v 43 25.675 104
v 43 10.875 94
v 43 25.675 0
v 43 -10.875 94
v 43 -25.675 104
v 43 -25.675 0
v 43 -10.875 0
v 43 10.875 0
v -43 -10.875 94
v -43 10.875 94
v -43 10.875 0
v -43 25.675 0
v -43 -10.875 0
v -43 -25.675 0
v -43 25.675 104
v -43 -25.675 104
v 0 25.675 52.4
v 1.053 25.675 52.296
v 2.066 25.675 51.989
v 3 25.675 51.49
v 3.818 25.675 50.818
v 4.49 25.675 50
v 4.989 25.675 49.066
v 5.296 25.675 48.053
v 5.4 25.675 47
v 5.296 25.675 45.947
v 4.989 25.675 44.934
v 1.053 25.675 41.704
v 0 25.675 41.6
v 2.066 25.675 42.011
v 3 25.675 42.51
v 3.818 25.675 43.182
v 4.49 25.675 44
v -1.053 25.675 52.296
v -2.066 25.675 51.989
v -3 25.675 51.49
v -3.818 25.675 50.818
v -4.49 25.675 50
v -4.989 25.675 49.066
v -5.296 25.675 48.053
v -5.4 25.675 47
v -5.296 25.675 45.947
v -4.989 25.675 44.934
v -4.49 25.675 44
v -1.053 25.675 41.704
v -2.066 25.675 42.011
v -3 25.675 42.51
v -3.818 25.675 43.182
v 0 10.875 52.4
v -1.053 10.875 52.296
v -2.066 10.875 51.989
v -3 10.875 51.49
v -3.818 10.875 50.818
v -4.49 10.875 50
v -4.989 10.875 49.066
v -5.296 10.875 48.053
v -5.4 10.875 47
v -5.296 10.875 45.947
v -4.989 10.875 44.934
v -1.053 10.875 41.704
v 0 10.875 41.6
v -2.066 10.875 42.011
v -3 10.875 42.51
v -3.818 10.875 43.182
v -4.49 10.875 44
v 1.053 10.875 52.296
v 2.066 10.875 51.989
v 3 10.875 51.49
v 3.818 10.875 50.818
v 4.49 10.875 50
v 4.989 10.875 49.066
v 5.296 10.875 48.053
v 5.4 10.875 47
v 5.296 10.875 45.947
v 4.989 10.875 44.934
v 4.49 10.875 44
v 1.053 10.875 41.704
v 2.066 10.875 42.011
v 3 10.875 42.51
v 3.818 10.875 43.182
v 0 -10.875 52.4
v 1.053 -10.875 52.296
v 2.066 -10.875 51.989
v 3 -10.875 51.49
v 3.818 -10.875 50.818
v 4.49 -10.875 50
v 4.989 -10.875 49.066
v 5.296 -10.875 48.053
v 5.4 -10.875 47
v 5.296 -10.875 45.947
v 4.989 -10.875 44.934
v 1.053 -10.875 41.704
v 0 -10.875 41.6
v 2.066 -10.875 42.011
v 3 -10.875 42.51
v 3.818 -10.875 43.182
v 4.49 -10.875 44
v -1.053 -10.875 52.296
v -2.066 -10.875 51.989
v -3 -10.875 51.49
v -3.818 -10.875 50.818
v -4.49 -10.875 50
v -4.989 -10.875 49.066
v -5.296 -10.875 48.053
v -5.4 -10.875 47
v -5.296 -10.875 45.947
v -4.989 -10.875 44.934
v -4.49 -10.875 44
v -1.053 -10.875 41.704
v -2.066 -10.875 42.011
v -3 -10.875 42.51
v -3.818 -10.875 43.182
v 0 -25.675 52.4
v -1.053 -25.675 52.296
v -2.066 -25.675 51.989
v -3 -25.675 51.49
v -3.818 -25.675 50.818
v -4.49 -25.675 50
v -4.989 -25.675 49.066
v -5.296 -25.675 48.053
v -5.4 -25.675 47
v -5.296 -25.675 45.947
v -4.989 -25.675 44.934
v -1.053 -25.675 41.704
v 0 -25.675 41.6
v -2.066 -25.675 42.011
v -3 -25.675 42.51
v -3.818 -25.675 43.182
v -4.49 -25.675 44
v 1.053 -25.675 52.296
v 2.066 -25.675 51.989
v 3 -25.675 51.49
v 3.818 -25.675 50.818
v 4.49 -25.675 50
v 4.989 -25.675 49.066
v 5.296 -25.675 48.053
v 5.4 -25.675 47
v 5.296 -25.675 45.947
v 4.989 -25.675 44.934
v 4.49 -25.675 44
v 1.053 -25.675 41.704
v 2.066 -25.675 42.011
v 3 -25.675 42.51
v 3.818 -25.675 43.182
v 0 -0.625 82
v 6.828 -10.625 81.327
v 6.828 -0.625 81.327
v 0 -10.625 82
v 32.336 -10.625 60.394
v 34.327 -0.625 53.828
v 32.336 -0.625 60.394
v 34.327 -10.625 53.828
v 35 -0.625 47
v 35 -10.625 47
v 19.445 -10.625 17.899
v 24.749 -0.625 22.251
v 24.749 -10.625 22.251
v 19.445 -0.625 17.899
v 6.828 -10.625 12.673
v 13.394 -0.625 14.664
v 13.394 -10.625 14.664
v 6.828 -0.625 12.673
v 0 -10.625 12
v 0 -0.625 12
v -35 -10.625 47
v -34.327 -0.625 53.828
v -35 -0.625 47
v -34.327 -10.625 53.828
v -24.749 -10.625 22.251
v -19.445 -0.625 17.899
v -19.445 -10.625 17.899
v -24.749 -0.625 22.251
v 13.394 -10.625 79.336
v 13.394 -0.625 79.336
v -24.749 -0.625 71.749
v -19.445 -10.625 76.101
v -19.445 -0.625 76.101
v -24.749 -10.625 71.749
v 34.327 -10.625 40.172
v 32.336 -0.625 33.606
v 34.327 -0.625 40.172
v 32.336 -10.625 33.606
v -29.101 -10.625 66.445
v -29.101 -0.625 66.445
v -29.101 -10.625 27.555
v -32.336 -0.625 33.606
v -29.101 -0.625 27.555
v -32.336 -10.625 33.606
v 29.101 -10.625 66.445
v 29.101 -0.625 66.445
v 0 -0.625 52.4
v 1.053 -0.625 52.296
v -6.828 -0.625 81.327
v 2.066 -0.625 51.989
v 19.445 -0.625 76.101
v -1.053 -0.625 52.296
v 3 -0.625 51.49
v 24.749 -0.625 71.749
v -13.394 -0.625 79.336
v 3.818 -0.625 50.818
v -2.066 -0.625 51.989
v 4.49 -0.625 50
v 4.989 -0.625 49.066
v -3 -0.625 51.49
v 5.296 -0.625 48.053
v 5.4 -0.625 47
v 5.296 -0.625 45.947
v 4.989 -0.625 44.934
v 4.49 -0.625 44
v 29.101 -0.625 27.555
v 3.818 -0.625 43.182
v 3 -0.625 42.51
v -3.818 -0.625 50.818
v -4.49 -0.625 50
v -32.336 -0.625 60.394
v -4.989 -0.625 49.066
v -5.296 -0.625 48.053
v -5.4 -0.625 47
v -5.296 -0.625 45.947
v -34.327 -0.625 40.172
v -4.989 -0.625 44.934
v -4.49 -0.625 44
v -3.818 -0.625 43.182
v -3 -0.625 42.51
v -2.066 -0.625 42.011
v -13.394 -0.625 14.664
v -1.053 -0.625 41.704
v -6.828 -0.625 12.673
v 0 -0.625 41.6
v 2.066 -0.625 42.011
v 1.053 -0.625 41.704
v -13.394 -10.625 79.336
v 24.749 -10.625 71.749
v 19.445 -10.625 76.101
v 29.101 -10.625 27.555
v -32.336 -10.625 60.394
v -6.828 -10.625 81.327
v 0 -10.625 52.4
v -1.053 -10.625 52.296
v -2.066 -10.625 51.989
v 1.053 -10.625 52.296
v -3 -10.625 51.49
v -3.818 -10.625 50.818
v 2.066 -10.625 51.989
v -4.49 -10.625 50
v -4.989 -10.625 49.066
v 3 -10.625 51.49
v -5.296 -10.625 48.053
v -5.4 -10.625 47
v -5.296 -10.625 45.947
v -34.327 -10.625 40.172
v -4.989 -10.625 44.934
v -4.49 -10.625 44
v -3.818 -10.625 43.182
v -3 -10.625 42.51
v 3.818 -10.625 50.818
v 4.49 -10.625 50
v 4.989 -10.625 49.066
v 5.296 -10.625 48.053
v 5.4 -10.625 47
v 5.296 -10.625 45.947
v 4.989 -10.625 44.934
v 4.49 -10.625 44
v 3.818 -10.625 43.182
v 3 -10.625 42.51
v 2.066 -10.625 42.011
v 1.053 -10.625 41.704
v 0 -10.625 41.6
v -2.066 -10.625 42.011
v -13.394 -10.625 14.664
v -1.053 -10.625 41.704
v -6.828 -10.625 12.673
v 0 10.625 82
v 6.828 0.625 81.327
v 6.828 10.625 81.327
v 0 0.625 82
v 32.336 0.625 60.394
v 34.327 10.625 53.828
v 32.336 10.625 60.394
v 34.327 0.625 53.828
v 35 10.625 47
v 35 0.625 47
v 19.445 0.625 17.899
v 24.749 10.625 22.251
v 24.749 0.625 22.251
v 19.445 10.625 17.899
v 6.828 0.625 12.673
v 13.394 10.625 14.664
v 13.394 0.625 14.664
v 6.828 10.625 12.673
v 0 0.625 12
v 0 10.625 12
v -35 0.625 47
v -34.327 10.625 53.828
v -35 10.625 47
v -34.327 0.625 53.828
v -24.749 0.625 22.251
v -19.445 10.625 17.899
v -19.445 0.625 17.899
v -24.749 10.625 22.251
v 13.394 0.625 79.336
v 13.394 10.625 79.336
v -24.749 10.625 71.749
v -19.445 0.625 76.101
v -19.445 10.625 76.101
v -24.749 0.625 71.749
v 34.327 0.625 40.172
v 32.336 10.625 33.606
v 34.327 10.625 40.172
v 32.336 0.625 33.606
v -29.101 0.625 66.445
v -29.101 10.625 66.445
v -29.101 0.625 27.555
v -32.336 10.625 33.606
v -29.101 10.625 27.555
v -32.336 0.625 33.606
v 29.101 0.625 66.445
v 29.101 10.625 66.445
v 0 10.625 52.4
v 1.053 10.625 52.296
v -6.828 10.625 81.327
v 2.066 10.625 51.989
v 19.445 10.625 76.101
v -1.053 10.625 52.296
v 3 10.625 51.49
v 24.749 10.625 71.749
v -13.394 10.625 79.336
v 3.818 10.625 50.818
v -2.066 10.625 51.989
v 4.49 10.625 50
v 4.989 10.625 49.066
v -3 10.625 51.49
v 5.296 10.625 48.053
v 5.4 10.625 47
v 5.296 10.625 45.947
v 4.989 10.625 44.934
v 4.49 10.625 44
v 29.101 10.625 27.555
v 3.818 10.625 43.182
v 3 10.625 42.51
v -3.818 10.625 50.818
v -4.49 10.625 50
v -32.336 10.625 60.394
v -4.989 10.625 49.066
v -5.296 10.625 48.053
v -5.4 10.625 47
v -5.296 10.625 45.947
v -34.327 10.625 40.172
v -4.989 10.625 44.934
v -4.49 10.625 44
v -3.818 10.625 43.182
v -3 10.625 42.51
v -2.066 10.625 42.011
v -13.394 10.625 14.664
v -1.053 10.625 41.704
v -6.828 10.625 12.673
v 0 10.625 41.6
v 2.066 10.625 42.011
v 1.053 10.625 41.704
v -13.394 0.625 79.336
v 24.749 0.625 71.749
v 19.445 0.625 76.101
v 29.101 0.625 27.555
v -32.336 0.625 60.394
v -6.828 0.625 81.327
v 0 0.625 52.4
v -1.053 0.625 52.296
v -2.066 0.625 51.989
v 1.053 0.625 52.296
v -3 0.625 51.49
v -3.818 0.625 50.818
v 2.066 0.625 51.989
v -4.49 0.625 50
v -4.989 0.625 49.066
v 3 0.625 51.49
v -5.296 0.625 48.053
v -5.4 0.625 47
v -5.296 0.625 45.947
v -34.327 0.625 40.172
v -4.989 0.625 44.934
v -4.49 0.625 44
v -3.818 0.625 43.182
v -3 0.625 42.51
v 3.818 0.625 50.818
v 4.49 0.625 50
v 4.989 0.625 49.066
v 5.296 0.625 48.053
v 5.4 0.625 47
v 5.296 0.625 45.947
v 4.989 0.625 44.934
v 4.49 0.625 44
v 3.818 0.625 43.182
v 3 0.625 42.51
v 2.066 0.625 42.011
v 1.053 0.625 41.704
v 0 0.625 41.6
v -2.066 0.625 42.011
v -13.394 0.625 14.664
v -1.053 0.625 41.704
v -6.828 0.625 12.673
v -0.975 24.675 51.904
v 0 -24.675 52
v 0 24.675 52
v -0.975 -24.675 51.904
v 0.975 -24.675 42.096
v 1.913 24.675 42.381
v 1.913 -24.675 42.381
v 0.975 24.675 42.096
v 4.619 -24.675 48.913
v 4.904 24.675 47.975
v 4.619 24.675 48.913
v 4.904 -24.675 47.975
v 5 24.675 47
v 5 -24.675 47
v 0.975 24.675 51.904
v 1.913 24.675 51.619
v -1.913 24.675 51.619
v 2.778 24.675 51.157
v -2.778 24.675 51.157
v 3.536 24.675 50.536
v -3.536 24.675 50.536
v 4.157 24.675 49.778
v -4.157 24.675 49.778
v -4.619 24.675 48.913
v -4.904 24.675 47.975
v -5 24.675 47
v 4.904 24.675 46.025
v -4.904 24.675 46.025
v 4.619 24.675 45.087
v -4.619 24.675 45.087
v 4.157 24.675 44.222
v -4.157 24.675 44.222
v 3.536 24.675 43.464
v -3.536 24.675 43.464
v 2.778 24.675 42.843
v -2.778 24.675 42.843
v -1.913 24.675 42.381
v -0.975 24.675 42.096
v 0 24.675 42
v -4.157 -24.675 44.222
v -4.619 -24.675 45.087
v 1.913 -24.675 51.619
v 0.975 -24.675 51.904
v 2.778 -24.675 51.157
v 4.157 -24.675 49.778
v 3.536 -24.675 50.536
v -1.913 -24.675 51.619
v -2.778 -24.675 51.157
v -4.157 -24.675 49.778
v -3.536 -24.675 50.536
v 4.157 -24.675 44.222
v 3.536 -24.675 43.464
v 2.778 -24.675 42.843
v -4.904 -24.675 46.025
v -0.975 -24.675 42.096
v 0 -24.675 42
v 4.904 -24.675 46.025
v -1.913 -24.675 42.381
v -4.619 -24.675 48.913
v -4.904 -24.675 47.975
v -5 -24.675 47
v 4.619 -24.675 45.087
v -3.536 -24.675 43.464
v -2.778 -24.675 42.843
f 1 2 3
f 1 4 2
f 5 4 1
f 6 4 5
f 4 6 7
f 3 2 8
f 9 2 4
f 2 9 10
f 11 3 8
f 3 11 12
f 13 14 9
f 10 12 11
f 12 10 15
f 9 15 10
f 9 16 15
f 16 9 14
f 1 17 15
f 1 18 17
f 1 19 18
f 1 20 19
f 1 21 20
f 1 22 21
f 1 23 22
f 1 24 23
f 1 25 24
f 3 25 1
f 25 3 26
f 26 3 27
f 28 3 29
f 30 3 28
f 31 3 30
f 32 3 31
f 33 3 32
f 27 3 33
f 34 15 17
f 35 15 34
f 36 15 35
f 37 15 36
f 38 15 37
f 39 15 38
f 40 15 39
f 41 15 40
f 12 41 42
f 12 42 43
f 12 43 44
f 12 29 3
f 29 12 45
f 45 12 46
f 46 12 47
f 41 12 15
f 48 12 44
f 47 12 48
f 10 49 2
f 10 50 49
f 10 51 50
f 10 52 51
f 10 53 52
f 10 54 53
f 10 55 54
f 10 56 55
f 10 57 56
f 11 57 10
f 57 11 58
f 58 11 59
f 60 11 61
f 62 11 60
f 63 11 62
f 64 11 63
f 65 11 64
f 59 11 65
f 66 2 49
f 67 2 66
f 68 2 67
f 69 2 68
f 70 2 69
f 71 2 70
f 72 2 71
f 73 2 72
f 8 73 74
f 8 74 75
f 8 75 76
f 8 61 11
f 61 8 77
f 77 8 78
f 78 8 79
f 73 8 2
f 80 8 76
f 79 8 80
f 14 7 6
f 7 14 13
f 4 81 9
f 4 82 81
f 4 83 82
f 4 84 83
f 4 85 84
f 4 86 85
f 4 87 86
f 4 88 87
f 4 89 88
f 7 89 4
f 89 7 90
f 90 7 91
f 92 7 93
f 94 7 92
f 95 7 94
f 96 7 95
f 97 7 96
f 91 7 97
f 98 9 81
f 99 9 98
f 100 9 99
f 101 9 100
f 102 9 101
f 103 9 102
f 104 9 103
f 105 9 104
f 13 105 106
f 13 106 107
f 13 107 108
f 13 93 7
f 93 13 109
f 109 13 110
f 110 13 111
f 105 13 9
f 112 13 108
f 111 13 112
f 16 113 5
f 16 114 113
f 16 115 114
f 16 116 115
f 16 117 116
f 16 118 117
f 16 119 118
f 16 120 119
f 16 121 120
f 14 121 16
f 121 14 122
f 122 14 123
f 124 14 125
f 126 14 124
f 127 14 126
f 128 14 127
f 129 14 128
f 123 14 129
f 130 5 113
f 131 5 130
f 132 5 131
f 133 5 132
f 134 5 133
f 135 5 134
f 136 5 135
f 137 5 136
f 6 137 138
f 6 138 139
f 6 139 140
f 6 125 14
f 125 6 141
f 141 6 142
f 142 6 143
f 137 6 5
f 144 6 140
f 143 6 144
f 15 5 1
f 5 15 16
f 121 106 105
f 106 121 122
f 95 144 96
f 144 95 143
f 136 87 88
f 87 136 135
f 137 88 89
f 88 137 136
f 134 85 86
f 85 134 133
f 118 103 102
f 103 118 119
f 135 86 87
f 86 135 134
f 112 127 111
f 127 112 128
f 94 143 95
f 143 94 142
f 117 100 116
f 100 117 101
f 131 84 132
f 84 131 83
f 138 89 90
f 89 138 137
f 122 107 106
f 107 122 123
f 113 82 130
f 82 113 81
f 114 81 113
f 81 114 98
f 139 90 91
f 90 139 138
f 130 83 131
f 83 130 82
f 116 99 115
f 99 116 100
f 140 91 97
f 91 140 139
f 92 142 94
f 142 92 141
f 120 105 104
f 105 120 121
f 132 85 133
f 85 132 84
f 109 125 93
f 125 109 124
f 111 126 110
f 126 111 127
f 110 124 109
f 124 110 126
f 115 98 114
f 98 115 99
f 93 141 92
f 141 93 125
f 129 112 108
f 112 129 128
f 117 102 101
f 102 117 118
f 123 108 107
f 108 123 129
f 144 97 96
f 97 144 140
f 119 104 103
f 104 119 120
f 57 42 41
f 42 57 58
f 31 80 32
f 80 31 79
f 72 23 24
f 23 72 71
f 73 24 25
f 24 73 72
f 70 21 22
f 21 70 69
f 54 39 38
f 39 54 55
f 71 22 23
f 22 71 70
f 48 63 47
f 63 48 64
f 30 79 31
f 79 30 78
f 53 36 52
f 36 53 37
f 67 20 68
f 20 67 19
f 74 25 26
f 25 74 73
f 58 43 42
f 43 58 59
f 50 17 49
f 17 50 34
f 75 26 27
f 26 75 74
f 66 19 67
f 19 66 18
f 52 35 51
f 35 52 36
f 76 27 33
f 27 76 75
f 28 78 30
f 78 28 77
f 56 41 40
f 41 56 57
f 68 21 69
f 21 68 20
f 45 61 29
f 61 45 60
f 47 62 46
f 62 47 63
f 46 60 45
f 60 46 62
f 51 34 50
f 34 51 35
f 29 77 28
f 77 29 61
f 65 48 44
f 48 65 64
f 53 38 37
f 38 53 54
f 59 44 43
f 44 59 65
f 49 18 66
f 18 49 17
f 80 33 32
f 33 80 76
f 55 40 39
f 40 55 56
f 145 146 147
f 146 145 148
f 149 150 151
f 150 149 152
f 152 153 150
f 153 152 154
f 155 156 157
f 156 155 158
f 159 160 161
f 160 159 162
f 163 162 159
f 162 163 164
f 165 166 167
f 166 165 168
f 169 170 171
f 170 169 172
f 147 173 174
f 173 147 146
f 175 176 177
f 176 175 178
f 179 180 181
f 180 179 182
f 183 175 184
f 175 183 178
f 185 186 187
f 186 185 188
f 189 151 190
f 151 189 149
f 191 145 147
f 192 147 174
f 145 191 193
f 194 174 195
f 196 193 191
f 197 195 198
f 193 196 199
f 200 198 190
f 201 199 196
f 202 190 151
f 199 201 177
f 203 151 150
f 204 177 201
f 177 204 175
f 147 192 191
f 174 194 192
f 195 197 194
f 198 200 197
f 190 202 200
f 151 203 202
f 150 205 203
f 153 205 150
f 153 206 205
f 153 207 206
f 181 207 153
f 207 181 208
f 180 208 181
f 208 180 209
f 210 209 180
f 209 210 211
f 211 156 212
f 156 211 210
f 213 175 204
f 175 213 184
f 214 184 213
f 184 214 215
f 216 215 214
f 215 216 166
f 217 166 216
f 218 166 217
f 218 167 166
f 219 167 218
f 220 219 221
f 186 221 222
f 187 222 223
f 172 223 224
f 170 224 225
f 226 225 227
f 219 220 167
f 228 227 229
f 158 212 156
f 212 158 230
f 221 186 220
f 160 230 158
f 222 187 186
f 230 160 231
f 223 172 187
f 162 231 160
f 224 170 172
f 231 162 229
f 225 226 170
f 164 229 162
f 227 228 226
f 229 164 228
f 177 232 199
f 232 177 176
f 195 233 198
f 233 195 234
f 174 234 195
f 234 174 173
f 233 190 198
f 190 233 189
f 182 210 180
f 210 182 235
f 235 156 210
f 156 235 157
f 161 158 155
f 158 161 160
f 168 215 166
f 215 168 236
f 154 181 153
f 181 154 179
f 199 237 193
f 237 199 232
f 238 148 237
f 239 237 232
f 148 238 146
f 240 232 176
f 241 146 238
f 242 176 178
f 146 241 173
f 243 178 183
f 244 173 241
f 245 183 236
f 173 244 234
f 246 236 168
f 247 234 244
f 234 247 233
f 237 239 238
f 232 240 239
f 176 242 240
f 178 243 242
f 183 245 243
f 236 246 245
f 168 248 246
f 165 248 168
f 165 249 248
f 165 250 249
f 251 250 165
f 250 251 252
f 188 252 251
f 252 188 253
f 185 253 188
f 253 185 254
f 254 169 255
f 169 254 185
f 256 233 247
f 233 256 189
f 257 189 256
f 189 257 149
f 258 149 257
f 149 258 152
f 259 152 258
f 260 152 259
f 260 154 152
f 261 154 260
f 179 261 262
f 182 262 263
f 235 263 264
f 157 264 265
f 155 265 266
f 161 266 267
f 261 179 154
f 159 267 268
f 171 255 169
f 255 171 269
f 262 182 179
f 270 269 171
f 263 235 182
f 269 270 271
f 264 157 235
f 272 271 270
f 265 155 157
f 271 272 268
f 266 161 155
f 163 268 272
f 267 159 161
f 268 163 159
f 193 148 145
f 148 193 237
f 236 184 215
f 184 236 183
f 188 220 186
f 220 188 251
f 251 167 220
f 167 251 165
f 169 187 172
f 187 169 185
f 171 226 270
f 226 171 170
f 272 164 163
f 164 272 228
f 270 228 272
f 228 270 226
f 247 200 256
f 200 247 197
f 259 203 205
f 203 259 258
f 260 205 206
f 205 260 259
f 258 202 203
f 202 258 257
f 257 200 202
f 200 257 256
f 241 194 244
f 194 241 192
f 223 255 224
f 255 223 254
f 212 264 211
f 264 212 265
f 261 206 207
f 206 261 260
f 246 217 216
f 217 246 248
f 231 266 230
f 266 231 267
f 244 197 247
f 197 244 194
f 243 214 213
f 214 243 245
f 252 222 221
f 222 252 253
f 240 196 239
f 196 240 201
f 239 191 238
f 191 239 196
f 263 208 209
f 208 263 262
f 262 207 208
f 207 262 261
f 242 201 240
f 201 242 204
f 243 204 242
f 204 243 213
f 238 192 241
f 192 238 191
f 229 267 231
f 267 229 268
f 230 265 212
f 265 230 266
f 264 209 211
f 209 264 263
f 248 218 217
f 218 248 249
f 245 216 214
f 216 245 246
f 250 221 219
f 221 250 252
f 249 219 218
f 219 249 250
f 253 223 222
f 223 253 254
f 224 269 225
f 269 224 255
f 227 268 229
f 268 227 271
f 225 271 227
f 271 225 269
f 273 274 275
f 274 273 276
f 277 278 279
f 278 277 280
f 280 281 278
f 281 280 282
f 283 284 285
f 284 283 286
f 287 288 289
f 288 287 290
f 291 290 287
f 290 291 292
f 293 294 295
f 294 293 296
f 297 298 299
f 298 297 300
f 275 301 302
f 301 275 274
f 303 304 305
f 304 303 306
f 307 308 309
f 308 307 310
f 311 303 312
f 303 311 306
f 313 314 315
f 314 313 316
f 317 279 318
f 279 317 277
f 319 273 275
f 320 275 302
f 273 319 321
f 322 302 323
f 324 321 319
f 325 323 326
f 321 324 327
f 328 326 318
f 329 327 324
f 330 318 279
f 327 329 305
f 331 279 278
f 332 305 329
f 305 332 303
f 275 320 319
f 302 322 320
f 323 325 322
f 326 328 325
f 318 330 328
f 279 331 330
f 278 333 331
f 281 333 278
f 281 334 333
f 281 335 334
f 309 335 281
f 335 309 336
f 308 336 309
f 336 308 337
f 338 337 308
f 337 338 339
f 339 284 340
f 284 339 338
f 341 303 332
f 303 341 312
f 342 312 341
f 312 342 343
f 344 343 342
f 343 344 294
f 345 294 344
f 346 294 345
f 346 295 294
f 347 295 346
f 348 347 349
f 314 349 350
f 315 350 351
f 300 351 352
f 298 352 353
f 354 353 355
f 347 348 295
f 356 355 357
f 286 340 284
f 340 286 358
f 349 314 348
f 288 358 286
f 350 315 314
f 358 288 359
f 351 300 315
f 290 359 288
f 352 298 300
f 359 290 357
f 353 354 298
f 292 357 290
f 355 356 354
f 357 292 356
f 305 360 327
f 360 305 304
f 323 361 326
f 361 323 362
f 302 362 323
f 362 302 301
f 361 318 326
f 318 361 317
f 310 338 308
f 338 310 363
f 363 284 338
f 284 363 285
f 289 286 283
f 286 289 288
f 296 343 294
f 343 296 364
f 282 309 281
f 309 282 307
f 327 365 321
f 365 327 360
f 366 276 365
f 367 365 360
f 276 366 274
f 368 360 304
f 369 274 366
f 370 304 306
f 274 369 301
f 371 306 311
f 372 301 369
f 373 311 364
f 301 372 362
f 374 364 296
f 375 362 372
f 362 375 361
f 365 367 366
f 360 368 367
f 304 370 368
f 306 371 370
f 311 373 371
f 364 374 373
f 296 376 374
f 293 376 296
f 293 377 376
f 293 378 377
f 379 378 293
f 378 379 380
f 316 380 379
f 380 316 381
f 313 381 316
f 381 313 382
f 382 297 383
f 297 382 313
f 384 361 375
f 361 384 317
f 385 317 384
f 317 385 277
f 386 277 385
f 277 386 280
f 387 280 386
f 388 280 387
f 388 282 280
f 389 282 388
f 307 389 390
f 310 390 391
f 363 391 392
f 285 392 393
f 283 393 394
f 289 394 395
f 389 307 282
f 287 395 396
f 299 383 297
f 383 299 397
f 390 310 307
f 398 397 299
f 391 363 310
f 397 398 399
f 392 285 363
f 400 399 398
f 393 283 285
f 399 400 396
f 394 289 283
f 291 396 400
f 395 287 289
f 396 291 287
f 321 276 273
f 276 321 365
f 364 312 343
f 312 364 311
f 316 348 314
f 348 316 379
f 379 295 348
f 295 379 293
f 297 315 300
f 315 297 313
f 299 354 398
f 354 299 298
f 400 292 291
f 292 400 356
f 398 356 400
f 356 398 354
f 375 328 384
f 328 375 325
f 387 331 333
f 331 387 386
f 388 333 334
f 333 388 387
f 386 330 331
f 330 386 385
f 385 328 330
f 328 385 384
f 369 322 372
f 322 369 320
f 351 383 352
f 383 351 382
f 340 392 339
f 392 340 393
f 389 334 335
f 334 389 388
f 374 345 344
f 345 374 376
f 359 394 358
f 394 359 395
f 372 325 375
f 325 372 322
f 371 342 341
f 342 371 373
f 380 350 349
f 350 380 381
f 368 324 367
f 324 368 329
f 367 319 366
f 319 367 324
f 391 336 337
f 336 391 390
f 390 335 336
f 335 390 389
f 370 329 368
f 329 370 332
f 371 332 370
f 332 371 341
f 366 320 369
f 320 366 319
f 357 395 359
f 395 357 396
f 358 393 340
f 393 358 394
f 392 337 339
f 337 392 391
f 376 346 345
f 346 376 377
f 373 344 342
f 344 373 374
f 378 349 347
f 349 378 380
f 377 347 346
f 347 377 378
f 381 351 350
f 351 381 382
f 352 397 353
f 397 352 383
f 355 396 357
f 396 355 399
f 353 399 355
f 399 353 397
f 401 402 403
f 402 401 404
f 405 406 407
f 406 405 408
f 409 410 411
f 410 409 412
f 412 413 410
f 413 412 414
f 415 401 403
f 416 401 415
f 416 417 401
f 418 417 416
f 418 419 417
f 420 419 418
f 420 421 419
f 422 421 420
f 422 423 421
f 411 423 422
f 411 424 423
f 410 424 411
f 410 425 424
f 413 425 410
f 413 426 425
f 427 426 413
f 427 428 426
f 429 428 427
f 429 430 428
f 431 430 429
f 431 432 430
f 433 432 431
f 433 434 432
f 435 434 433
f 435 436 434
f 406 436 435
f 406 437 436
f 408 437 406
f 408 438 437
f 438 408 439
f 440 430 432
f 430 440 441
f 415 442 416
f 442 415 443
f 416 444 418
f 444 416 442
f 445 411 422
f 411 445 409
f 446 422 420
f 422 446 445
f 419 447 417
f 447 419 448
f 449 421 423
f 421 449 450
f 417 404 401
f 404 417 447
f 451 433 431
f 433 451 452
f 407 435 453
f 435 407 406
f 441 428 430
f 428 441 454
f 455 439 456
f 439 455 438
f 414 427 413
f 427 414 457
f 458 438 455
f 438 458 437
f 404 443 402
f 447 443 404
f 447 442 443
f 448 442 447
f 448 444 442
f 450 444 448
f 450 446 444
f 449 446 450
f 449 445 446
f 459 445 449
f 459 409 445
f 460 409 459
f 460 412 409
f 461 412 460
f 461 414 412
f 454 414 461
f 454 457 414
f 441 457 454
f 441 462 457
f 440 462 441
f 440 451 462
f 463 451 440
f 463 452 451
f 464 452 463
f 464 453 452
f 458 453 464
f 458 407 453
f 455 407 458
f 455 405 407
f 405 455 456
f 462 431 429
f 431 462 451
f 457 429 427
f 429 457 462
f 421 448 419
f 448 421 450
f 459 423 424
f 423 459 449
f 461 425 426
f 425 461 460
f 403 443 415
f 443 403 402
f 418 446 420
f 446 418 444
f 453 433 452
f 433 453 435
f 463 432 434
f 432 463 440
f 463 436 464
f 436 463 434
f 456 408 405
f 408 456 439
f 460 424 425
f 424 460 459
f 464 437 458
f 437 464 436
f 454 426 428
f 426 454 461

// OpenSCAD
$fn = 32;

// ------------------------------------------------------------------------
// Trolley wheel set: wheels d70, fork 94 mm tall
// Every part is its own module, assembly() places every instance.
// ------------------------------------------------------------------------

// --- part 1 ---
module trolley_fork() {
  difference() {
    union() {
      translate([-43, 10.875, 0]) cube([86, 14.8, 94]);
      translate([-43, -25.675, 0]) cube([86, 14.8, 94]);
      translate([-43, -25.675, 94]) cube([86, 51.35, 10]);
    }
    translate([0, -18.275, 47]) rotate([90, 0, 0]) cylinder(h = 16.8, d = 10.8, center = true);
    translate([0, 18.275, 47]) rotate([90, 0, 0]) cylinder(h = 16.8, d = 10.8, center = true);
  }
}

// --- part 2 ---
module trolley_wheel() {
  difference() {
      translate([0, 0, 0]) cylinder(h = 10, d = 70);
      translate([0, 0, -1]) cylinder(h = 12, d = 10.8);
    }
}

// --- part 3 ---
module trolley_axle() {
  translate([0, 0, -24.675]) cylinder(h = 49.35, d = 10);
}

// --- assembly ---
module assembly() {
  color([0.80, 0.24, 0.20]) translate([0, 0, 0]) rotate([0, 0, 0]) trolley_fork();
  color([0.20, 0.45, 0.75]) translate([0, -0.625, 47]) rotate([90, 0, 0]) trolley_wheel();
  color([0.25, 0.62, 0.32]) translate([0, 10.625, 47]) rotate([90, 0, 0]) trolley_wheel();
  color([0.92, 0.70, 0.18]) translate([0, 0, 47]) rotate([90, 0, 0]) trolley_axle();
}

assembly();
